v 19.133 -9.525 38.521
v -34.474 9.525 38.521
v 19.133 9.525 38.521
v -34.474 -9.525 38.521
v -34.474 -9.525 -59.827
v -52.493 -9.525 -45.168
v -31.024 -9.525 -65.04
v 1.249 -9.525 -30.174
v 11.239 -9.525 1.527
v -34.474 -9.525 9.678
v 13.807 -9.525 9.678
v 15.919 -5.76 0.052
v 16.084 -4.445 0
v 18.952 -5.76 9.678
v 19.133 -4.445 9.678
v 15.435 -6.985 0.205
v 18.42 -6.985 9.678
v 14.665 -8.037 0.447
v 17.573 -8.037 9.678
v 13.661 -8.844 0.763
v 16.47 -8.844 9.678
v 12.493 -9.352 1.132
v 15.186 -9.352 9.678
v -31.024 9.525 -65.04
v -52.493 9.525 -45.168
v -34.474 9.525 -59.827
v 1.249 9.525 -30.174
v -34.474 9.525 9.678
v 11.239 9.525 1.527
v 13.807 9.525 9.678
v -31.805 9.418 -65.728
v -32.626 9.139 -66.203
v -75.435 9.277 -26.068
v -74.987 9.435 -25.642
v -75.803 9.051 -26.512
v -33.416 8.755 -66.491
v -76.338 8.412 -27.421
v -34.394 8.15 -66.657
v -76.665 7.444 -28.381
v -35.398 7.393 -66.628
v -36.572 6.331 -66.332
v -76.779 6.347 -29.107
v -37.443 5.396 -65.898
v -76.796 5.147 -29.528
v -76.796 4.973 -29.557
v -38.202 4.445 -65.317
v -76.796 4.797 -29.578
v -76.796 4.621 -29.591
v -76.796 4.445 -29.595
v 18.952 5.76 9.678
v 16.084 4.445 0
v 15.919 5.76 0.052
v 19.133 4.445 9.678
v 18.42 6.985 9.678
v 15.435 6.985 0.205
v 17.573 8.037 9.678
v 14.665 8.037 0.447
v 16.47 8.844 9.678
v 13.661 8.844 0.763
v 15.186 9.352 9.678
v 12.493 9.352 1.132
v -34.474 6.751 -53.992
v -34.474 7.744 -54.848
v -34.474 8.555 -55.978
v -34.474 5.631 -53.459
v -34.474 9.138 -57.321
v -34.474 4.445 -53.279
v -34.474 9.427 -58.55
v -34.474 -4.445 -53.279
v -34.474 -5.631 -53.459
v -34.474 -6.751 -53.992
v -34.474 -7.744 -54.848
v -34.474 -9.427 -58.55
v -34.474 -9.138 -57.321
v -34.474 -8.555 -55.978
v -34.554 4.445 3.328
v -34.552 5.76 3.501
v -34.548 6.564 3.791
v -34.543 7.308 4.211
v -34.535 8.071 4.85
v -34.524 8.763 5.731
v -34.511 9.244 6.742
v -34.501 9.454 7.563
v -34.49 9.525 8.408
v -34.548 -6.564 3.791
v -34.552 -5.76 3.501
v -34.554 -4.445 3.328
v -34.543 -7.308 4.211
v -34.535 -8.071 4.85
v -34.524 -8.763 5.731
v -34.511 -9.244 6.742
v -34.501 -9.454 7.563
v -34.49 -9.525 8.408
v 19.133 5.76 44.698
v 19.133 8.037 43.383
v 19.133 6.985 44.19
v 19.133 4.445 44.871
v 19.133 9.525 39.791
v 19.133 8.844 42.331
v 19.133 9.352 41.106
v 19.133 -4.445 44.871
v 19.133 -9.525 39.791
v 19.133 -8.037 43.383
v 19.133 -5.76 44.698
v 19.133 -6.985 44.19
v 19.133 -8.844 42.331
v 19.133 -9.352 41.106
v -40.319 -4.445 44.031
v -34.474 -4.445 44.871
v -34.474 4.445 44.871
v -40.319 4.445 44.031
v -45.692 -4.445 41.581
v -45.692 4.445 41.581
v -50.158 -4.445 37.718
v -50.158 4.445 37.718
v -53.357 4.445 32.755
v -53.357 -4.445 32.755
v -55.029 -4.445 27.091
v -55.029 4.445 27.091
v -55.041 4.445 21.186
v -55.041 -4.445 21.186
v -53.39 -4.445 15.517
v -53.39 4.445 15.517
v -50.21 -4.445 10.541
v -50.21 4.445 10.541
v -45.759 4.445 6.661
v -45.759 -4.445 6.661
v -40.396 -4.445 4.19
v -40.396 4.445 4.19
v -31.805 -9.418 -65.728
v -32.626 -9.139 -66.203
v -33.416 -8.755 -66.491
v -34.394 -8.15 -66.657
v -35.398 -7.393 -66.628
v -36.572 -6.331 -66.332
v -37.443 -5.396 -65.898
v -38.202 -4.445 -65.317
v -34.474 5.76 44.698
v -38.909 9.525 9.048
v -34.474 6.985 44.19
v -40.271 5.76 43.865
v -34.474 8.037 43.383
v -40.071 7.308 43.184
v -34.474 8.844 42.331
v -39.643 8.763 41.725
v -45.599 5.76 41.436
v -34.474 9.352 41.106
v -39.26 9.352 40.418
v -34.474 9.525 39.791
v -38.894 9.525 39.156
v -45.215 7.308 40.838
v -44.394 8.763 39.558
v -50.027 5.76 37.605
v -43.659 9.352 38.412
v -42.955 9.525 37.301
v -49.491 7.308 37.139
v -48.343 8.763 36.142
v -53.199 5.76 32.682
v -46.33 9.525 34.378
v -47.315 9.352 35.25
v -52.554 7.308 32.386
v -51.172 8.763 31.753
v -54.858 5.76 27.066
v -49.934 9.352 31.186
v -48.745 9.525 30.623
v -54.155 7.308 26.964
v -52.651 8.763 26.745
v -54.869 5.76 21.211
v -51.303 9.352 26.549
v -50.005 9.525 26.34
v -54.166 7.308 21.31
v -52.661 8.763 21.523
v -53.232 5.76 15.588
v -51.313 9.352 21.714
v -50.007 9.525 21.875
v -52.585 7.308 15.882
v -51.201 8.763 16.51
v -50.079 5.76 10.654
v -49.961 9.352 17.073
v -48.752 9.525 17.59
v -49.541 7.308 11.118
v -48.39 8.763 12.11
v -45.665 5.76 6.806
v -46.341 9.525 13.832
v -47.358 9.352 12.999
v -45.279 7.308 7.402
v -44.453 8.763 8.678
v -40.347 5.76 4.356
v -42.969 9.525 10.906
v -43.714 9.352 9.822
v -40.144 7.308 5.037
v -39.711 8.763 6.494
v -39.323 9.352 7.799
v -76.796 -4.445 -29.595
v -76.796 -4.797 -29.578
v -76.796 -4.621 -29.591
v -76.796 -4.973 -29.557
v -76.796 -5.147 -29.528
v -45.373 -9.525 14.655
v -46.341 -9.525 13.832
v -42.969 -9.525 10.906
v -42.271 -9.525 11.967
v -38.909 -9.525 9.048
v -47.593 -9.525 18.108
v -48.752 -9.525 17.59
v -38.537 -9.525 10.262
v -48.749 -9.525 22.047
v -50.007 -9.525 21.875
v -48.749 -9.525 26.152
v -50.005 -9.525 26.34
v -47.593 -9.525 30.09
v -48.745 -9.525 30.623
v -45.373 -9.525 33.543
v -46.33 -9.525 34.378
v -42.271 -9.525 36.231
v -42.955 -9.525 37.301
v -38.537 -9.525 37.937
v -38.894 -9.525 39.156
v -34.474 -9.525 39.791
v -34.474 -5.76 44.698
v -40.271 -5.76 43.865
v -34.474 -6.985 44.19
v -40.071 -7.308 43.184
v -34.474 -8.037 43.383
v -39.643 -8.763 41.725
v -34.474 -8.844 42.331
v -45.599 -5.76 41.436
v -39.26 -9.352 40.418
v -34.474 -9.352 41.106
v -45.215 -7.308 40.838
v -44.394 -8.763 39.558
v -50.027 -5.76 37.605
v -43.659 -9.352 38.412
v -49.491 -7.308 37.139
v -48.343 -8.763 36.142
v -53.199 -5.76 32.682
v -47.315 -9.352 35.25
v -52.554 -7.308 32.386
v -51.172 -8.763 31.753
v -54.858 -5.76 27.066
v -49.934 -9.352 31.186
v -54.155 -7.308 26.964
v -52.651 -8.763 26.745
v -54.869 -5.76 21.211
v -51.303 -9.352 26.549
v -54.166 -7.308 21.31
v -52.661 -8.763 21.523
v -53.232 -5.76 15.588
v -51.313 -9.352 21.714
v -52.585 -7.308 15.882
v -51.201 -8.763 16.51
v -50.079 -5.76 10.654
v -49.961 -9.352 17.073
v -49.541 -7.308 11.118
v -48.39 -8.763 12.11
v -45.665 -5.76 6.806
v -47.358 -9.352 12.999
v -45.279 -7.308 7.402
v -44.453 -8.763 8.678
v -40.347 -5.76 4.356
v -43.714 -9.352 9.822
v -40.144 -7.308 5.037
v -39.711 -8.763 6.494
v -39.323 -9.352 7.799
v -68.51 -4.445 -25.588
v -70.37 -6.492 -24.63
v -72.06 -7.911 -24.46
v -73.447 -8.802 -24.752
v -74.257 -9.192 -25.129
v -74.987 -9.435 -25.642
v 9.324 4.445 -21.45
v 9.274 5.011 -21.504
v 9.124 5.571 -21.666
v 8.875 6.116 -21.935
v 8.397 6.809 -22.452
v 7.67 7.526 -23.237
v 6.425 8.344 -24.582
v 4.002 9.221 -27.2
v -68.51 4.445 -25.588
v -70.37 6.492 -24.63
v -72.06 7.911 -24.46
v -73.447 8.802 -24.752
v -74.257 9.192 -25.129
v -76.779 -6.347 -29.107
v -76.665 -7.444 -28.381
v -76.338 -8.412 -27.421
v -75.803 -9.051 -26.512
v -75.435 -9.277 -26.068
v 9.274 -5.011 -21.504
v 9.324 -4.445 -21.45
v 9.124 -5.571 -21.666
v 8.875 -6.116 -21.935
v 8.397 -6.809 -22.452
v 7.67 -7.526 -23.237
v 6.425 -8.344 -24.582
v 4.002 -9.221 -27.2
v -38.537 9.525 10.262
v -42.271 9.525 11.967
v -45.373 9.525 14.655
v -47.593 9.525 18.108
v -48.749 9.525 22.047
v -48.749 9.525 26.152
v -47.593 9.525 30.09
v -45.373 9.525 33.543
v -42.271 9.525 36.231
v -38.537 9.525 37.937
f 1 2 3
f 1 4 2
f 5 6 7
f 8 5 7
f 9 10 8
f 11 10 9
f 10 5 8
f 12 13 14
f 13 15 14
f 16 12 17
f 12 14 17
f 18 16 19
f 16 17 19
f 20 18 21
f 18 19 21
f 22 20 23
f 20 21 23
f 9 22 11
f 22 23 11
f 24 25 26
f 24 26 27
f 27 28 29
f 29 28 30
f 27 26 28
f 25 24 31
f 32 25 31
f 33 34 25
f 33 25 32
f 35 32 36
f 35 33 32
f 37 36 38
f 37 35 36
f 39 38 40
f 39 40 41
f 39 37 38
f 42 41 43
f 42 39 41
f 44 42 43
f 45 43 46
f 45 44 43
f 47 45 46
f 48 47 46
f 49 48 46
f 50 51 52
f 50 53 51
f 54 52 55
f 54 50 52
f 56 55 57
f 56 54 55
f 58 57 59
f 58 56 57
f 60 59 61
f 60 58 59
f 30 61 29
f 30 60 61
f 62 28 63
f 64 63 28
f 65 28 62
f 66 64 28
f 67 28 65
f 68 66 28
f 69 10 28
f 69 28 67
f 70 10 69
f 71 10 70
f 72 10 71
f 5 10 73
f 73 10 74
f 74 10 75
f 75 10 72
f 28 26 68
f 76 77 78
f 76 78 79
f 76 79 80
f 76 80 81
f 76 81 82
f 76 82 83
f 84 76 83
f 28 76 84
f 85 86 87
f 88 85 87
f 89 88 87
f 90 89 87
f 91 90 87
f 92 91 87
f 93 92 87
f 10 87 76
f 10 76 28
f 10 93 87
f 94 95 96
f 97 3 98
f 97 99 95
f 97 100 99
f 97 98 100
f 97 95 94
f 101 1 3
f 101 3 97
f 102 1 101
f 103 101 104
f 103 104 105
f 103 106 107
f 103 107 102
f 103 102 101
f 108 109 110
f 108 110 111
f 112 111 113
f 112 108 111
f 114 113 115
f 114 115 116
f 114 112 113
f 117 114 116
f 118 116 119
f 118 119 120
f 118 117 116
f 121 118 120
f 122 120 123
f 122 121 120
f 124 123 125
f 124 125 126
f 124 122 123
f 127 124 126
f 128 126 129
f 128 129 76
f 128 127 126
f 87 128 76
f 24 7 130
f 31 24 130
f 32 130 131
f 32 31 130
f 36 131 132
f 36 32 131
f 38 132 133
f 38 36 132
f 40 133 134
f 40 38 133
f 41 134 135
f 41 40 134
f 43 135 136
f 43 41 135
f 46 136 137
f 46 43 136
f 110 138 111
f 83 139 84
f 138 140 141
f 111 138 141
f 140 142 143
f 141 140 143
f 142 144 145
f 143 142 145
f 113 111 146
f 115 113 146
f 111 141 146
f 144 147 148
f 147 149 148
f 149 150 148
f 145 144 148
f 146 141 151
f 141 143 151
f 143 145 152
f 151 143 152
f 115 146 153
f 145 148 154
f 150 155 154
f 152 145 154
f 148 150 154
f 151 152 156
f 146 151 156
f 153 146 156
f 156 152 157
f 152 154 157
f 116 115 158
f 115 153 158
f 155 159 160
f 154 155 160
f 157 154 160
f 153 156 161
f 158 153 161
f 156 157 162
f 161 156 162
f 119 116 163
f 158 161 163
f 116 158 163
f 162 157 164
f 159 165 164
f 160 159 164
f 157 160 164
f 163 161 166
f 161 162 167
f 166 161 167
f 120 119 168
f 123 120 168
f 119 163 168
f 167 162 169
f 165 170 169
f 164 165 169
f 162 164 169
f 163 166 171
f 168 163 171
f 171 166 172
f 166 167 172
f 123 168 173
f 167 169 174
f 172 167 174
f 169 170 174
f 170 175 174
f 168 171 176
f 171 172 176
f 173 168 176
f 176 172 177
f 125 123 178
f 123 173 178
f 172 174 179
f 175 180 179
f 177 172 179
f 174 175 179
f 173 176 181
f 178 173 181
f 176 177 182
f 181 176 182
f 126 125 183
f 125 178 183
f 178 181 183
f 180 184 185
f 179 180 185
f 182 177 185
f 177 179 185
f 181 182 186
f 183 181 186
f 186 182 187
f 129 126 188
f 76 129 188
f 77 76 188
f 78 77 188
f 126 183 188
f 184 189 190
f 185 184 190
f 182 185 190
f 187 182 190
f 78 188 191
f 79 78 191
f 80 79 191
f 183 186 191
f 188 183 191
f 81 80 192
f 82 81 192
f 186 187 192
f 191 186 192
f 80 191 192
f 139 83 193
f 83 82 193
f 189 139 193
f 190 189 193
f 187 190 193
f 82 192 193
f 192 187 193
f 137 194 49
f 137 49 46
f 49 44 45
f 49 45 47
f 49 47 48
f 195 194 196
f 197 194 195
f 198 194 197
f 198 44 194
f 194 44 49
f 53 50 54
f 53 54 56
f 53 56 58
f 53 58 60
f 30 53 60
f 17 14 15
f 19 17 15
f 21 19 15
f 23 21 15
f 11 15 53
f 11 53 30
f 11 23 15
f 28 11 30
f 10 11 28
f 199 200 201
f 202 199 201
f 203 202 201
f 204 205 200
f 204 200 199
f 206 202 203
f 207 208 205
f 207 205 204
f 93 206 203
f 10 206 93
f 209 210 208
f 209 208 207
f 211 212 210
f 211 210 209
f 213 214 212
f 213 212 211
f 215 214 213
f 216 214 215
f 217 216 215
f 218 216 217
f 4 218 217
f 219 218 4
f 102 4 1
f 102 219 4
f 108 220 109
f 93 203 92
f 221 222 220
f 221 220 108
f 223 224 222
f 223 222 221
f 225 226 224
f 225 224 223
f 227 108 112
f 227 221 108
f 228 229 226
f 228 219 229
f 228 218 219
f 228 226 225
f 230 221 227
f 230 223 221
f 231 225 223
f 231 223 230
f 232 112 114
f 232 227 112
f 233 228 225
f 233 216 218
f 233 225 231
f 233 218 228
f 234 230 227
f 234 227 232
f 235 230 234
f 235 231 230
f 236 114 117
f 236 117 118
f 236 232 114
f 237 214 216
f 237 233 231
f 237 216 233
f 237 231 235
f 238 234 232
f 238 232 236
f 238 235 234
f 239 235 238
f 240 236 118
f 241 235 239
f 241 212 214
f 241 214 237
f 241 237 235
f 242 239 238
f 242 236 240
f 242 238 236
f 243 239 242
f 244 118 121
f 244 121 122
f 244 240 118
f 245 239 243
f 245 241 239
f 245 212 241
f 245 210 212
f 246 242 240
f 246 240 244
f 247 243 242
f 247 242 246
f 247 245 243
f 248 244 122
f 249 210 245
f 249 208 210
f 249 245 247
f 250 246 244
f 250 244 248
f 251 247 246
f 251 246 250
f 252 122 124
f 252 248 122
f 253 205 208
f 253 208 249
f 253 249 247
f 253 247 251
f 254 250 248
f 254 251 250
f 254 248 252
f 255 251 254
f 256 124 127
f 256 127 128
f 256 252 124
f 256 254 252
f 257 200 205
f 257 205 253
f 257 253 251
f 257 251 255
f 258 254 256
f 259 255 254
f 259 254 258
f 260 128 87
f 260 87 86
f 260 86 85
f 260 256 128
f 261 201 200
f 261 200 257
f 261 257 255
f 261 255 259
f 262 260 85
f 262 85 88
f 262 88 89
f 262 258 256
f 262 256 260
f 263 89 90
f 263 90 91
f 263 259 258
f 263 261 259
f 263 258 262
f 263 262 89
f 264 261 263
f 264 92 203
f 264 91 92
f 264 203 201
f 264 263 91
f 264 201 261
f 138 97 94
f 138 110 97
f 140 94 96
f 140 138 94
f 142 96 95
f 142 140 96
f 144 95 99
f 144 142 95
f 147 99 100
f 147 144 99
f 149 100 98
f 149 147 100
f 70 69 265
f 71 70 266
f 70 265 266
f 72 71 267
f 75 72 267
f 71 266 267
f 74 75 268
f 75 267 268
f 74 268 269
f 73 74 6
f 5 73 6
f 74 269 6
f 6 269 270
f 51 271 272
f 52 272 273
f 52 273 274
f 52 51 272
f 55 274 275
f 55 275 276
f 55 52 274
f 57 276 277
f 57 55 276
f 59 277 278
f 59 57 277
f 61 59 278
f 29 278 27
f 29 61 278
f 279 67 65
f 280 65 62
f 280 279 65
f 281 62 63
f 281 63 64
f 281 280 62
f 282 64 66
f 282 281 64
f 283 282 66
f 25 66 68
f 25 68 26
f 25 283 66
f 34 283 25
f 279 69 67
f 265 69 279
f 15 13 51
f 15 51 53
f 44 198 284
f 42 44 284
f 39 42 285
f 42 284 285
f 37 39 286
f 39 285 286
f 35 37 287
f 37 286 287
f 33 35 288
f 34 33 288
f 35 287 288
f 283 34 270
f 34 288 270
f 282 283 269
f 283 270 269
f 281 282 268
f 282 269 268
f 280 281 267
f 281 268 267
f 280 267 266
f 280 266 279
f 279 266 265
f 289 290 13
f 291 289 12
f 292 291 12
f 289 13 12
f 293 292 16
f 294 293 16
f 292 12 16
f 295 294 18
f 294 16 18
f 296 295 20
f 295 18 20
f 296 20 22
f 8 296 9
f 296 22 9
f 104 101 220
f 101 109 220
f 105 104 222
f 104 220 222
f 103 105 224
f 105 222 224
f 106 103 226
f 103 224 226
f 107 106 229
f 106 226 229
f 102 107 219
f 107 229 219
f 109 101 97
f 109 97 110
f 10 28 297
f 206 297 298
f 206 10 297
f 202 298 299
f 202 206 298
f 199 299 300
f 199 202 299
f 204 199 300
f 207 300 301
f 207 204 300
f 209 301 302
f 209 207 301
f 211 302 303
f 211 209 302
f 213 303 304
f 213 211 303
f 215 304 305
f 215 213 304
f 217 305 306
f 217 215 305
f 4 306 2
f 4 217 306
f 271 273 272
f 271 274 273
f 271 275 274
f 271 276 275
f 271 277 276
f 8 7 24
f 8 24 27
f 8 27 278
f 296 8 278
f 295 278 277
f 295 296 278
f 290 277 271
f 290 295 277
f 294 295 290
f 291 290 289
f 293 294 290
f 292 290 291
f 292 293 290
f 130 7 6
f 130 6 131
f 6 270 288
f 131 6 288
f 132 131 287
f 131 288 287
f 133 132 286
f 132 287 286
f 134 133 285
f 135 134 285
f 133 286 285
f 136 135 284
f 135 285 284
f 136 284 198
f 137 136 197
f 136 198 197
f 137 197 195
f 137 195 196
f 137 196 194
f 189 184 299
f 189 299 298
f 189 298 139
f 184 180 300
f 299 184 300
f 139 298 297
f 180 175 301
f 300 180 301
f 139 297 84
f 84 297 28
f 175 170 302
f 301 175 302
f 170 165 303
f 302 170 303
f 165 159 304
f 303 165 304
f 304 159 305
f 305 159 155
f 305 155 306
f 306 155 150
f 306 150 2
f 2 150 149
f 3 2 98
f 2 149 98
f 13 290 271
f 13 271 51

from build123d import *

# Parameters (mm, degrees)
F1_DEPTH    = 9.525
F2_R        = 5.08
F2_2_R      = 5.08
F3_T1_DEPTH = 44.45
F3_T3_DEPTH = 83.0687423867


# Not quite as in the source:
# - a fillet or chamfer that OpenCascade refuses, or shapes differently, is made with other operations: its cross-section is extruded or revolved along the edge and cut away or added


with BuildPart() as f1:
    # F0 (on Front) → F1 (new body, symmetric)
    with BuildSketch(Plane.XZ):
        Polygon((19.1333722323, 9.6779013216), (-34.4743542373, 9.6779013216), (-34.4743542373, 0), (16.0836418411, 0), align=None)
        Polygon((9.3244023705, -21.4495198637), (-34.4743542373, -21.4495198637), (-34.4743542373, -53.2785505056), (-34.4743542373, -68.7682205643), align=None)
        Polygon((-34.4743542373, -68.7682205643), (-34.4743542373, -53.2785505056), (-76.7960324883, -18.846389095), (-76.7960324883, -29.5947678383), align=None)
        Polygon((16.0836418411, 0), (-34.4743542373, 0), (-34.4743542373, -21.4495198637), (9.3244023705, -21.4495198637), align=None)
    extrude(amount=F1_DEPTH, both=True)

    # F2#2
    f2_2_edges = [f1.edges().sort_by_distance(p)[0] for p in [
        (-55.635193, -9.525, -36.06247),
        (-76.796032, 0, -18.846389),
        (-55.635193, 9.525, -36.06247),
        (14.228887, -9.525, -5.885809),
        (14.228887, 9.525, -5.885809),
    ]]
    fillet(f2_2_edges, radius=F2_2_R)

    # F3: fillet of radius 5.08 on 4 edges, made by hand

    # F3_s2 → F3_t1 (cut)
    with BuildSketch(Plane.XZ.offset(-22.225)):
        with BuildLine():
            ThreePointArc((-31.0235916298, -65.0401329276), (-34.5555808578, -66.6655840089), (-38.202441874, -65.3174579569))
            Line((-38.202441874, -65.3174579569), (-34.4743542373, -68.7682205643))
            Line((-34.4743542373, -68.7682205643), (-31.0235916298, -65.0401329276))
        make_face()
    extrude(amount=F3_T1_DEPTH, mode=Mode.SUBTRACT)

    # F3_s4 → F3_t3 (cut)
    with BuildSketch(Plane(origin=(-35.9272257857, 0, 33.2546708697), x_dir=(0, 1, 0), z_dir=(0.733875519, 0, -0.6792839778))):
        with BuildLine():
            ThreePointArc((-9.525, -68.8051900398), (-8.0371024484, -72.3972924882), (-4.445, -73.8851900398))
            Line((-4.445, -73.8851900398), (-9.525, -73.8851900398))
            Line((-9.525, -73.8851900398), (-9.525, -68.8051900398))
        make_face()
        with BuildLine():
            ThreePointArc((9.525, -68.8051900398), (8.0371024484, -72.3972924882), (4.445, -73.8851900398))
            Line((4.445, -73.8851900398), (9.525, -73.8851900398))
            Line((9.525, -73.8851900398), (9.525, -68.8051900398))
        make_face()
    extrude(amount=F3_T3_DEPTH, mode=Mode.SUBTRACT)


with BuildPart() as f1b:
    # F0 (on Front) → F1, piece 2 (new body, symmetric)
    with BuildSketch(Plane.XZ):
        with BuildLine():
            Line((-34.4743542373, 38.5207416654), (19.1333722323, 38.5207416654))
            Line((19.1333722323, 38.5207416654), (19.1333722323, 44.8707416654))
            Line((19.1333722323, 44.8707416654), (-34.4743542373, 44.8707416654))
            ThreePointArc((-34.4743542373, 44.8707416654), (-55.2457359555, 24.1392899111), (-34.5542909246, 3.3280551363))
            Line((-34.5542909246, 3.3280551363), (-34.4743542373, 9.6779013216))
            ThreePointArc((-34.4743542373, 9.6779013216), (-48.8957744092, 24.0993214935), (-34.4743542373, 38.5207416654))
        make_face()
    extrude(amount=F1_DEPTH, both=True)

    # F2
    f2_edges = [f1b.edges().sort_by_distance(p)[0] for p in [
        (-7.670491, -9.525, 44.870742),
        (-7.670491, 9.525, 44.870742),
    ]]
    fillet(f2_edges, radius=F2_R)


solid = Compound([f1.part, f1b.part])
